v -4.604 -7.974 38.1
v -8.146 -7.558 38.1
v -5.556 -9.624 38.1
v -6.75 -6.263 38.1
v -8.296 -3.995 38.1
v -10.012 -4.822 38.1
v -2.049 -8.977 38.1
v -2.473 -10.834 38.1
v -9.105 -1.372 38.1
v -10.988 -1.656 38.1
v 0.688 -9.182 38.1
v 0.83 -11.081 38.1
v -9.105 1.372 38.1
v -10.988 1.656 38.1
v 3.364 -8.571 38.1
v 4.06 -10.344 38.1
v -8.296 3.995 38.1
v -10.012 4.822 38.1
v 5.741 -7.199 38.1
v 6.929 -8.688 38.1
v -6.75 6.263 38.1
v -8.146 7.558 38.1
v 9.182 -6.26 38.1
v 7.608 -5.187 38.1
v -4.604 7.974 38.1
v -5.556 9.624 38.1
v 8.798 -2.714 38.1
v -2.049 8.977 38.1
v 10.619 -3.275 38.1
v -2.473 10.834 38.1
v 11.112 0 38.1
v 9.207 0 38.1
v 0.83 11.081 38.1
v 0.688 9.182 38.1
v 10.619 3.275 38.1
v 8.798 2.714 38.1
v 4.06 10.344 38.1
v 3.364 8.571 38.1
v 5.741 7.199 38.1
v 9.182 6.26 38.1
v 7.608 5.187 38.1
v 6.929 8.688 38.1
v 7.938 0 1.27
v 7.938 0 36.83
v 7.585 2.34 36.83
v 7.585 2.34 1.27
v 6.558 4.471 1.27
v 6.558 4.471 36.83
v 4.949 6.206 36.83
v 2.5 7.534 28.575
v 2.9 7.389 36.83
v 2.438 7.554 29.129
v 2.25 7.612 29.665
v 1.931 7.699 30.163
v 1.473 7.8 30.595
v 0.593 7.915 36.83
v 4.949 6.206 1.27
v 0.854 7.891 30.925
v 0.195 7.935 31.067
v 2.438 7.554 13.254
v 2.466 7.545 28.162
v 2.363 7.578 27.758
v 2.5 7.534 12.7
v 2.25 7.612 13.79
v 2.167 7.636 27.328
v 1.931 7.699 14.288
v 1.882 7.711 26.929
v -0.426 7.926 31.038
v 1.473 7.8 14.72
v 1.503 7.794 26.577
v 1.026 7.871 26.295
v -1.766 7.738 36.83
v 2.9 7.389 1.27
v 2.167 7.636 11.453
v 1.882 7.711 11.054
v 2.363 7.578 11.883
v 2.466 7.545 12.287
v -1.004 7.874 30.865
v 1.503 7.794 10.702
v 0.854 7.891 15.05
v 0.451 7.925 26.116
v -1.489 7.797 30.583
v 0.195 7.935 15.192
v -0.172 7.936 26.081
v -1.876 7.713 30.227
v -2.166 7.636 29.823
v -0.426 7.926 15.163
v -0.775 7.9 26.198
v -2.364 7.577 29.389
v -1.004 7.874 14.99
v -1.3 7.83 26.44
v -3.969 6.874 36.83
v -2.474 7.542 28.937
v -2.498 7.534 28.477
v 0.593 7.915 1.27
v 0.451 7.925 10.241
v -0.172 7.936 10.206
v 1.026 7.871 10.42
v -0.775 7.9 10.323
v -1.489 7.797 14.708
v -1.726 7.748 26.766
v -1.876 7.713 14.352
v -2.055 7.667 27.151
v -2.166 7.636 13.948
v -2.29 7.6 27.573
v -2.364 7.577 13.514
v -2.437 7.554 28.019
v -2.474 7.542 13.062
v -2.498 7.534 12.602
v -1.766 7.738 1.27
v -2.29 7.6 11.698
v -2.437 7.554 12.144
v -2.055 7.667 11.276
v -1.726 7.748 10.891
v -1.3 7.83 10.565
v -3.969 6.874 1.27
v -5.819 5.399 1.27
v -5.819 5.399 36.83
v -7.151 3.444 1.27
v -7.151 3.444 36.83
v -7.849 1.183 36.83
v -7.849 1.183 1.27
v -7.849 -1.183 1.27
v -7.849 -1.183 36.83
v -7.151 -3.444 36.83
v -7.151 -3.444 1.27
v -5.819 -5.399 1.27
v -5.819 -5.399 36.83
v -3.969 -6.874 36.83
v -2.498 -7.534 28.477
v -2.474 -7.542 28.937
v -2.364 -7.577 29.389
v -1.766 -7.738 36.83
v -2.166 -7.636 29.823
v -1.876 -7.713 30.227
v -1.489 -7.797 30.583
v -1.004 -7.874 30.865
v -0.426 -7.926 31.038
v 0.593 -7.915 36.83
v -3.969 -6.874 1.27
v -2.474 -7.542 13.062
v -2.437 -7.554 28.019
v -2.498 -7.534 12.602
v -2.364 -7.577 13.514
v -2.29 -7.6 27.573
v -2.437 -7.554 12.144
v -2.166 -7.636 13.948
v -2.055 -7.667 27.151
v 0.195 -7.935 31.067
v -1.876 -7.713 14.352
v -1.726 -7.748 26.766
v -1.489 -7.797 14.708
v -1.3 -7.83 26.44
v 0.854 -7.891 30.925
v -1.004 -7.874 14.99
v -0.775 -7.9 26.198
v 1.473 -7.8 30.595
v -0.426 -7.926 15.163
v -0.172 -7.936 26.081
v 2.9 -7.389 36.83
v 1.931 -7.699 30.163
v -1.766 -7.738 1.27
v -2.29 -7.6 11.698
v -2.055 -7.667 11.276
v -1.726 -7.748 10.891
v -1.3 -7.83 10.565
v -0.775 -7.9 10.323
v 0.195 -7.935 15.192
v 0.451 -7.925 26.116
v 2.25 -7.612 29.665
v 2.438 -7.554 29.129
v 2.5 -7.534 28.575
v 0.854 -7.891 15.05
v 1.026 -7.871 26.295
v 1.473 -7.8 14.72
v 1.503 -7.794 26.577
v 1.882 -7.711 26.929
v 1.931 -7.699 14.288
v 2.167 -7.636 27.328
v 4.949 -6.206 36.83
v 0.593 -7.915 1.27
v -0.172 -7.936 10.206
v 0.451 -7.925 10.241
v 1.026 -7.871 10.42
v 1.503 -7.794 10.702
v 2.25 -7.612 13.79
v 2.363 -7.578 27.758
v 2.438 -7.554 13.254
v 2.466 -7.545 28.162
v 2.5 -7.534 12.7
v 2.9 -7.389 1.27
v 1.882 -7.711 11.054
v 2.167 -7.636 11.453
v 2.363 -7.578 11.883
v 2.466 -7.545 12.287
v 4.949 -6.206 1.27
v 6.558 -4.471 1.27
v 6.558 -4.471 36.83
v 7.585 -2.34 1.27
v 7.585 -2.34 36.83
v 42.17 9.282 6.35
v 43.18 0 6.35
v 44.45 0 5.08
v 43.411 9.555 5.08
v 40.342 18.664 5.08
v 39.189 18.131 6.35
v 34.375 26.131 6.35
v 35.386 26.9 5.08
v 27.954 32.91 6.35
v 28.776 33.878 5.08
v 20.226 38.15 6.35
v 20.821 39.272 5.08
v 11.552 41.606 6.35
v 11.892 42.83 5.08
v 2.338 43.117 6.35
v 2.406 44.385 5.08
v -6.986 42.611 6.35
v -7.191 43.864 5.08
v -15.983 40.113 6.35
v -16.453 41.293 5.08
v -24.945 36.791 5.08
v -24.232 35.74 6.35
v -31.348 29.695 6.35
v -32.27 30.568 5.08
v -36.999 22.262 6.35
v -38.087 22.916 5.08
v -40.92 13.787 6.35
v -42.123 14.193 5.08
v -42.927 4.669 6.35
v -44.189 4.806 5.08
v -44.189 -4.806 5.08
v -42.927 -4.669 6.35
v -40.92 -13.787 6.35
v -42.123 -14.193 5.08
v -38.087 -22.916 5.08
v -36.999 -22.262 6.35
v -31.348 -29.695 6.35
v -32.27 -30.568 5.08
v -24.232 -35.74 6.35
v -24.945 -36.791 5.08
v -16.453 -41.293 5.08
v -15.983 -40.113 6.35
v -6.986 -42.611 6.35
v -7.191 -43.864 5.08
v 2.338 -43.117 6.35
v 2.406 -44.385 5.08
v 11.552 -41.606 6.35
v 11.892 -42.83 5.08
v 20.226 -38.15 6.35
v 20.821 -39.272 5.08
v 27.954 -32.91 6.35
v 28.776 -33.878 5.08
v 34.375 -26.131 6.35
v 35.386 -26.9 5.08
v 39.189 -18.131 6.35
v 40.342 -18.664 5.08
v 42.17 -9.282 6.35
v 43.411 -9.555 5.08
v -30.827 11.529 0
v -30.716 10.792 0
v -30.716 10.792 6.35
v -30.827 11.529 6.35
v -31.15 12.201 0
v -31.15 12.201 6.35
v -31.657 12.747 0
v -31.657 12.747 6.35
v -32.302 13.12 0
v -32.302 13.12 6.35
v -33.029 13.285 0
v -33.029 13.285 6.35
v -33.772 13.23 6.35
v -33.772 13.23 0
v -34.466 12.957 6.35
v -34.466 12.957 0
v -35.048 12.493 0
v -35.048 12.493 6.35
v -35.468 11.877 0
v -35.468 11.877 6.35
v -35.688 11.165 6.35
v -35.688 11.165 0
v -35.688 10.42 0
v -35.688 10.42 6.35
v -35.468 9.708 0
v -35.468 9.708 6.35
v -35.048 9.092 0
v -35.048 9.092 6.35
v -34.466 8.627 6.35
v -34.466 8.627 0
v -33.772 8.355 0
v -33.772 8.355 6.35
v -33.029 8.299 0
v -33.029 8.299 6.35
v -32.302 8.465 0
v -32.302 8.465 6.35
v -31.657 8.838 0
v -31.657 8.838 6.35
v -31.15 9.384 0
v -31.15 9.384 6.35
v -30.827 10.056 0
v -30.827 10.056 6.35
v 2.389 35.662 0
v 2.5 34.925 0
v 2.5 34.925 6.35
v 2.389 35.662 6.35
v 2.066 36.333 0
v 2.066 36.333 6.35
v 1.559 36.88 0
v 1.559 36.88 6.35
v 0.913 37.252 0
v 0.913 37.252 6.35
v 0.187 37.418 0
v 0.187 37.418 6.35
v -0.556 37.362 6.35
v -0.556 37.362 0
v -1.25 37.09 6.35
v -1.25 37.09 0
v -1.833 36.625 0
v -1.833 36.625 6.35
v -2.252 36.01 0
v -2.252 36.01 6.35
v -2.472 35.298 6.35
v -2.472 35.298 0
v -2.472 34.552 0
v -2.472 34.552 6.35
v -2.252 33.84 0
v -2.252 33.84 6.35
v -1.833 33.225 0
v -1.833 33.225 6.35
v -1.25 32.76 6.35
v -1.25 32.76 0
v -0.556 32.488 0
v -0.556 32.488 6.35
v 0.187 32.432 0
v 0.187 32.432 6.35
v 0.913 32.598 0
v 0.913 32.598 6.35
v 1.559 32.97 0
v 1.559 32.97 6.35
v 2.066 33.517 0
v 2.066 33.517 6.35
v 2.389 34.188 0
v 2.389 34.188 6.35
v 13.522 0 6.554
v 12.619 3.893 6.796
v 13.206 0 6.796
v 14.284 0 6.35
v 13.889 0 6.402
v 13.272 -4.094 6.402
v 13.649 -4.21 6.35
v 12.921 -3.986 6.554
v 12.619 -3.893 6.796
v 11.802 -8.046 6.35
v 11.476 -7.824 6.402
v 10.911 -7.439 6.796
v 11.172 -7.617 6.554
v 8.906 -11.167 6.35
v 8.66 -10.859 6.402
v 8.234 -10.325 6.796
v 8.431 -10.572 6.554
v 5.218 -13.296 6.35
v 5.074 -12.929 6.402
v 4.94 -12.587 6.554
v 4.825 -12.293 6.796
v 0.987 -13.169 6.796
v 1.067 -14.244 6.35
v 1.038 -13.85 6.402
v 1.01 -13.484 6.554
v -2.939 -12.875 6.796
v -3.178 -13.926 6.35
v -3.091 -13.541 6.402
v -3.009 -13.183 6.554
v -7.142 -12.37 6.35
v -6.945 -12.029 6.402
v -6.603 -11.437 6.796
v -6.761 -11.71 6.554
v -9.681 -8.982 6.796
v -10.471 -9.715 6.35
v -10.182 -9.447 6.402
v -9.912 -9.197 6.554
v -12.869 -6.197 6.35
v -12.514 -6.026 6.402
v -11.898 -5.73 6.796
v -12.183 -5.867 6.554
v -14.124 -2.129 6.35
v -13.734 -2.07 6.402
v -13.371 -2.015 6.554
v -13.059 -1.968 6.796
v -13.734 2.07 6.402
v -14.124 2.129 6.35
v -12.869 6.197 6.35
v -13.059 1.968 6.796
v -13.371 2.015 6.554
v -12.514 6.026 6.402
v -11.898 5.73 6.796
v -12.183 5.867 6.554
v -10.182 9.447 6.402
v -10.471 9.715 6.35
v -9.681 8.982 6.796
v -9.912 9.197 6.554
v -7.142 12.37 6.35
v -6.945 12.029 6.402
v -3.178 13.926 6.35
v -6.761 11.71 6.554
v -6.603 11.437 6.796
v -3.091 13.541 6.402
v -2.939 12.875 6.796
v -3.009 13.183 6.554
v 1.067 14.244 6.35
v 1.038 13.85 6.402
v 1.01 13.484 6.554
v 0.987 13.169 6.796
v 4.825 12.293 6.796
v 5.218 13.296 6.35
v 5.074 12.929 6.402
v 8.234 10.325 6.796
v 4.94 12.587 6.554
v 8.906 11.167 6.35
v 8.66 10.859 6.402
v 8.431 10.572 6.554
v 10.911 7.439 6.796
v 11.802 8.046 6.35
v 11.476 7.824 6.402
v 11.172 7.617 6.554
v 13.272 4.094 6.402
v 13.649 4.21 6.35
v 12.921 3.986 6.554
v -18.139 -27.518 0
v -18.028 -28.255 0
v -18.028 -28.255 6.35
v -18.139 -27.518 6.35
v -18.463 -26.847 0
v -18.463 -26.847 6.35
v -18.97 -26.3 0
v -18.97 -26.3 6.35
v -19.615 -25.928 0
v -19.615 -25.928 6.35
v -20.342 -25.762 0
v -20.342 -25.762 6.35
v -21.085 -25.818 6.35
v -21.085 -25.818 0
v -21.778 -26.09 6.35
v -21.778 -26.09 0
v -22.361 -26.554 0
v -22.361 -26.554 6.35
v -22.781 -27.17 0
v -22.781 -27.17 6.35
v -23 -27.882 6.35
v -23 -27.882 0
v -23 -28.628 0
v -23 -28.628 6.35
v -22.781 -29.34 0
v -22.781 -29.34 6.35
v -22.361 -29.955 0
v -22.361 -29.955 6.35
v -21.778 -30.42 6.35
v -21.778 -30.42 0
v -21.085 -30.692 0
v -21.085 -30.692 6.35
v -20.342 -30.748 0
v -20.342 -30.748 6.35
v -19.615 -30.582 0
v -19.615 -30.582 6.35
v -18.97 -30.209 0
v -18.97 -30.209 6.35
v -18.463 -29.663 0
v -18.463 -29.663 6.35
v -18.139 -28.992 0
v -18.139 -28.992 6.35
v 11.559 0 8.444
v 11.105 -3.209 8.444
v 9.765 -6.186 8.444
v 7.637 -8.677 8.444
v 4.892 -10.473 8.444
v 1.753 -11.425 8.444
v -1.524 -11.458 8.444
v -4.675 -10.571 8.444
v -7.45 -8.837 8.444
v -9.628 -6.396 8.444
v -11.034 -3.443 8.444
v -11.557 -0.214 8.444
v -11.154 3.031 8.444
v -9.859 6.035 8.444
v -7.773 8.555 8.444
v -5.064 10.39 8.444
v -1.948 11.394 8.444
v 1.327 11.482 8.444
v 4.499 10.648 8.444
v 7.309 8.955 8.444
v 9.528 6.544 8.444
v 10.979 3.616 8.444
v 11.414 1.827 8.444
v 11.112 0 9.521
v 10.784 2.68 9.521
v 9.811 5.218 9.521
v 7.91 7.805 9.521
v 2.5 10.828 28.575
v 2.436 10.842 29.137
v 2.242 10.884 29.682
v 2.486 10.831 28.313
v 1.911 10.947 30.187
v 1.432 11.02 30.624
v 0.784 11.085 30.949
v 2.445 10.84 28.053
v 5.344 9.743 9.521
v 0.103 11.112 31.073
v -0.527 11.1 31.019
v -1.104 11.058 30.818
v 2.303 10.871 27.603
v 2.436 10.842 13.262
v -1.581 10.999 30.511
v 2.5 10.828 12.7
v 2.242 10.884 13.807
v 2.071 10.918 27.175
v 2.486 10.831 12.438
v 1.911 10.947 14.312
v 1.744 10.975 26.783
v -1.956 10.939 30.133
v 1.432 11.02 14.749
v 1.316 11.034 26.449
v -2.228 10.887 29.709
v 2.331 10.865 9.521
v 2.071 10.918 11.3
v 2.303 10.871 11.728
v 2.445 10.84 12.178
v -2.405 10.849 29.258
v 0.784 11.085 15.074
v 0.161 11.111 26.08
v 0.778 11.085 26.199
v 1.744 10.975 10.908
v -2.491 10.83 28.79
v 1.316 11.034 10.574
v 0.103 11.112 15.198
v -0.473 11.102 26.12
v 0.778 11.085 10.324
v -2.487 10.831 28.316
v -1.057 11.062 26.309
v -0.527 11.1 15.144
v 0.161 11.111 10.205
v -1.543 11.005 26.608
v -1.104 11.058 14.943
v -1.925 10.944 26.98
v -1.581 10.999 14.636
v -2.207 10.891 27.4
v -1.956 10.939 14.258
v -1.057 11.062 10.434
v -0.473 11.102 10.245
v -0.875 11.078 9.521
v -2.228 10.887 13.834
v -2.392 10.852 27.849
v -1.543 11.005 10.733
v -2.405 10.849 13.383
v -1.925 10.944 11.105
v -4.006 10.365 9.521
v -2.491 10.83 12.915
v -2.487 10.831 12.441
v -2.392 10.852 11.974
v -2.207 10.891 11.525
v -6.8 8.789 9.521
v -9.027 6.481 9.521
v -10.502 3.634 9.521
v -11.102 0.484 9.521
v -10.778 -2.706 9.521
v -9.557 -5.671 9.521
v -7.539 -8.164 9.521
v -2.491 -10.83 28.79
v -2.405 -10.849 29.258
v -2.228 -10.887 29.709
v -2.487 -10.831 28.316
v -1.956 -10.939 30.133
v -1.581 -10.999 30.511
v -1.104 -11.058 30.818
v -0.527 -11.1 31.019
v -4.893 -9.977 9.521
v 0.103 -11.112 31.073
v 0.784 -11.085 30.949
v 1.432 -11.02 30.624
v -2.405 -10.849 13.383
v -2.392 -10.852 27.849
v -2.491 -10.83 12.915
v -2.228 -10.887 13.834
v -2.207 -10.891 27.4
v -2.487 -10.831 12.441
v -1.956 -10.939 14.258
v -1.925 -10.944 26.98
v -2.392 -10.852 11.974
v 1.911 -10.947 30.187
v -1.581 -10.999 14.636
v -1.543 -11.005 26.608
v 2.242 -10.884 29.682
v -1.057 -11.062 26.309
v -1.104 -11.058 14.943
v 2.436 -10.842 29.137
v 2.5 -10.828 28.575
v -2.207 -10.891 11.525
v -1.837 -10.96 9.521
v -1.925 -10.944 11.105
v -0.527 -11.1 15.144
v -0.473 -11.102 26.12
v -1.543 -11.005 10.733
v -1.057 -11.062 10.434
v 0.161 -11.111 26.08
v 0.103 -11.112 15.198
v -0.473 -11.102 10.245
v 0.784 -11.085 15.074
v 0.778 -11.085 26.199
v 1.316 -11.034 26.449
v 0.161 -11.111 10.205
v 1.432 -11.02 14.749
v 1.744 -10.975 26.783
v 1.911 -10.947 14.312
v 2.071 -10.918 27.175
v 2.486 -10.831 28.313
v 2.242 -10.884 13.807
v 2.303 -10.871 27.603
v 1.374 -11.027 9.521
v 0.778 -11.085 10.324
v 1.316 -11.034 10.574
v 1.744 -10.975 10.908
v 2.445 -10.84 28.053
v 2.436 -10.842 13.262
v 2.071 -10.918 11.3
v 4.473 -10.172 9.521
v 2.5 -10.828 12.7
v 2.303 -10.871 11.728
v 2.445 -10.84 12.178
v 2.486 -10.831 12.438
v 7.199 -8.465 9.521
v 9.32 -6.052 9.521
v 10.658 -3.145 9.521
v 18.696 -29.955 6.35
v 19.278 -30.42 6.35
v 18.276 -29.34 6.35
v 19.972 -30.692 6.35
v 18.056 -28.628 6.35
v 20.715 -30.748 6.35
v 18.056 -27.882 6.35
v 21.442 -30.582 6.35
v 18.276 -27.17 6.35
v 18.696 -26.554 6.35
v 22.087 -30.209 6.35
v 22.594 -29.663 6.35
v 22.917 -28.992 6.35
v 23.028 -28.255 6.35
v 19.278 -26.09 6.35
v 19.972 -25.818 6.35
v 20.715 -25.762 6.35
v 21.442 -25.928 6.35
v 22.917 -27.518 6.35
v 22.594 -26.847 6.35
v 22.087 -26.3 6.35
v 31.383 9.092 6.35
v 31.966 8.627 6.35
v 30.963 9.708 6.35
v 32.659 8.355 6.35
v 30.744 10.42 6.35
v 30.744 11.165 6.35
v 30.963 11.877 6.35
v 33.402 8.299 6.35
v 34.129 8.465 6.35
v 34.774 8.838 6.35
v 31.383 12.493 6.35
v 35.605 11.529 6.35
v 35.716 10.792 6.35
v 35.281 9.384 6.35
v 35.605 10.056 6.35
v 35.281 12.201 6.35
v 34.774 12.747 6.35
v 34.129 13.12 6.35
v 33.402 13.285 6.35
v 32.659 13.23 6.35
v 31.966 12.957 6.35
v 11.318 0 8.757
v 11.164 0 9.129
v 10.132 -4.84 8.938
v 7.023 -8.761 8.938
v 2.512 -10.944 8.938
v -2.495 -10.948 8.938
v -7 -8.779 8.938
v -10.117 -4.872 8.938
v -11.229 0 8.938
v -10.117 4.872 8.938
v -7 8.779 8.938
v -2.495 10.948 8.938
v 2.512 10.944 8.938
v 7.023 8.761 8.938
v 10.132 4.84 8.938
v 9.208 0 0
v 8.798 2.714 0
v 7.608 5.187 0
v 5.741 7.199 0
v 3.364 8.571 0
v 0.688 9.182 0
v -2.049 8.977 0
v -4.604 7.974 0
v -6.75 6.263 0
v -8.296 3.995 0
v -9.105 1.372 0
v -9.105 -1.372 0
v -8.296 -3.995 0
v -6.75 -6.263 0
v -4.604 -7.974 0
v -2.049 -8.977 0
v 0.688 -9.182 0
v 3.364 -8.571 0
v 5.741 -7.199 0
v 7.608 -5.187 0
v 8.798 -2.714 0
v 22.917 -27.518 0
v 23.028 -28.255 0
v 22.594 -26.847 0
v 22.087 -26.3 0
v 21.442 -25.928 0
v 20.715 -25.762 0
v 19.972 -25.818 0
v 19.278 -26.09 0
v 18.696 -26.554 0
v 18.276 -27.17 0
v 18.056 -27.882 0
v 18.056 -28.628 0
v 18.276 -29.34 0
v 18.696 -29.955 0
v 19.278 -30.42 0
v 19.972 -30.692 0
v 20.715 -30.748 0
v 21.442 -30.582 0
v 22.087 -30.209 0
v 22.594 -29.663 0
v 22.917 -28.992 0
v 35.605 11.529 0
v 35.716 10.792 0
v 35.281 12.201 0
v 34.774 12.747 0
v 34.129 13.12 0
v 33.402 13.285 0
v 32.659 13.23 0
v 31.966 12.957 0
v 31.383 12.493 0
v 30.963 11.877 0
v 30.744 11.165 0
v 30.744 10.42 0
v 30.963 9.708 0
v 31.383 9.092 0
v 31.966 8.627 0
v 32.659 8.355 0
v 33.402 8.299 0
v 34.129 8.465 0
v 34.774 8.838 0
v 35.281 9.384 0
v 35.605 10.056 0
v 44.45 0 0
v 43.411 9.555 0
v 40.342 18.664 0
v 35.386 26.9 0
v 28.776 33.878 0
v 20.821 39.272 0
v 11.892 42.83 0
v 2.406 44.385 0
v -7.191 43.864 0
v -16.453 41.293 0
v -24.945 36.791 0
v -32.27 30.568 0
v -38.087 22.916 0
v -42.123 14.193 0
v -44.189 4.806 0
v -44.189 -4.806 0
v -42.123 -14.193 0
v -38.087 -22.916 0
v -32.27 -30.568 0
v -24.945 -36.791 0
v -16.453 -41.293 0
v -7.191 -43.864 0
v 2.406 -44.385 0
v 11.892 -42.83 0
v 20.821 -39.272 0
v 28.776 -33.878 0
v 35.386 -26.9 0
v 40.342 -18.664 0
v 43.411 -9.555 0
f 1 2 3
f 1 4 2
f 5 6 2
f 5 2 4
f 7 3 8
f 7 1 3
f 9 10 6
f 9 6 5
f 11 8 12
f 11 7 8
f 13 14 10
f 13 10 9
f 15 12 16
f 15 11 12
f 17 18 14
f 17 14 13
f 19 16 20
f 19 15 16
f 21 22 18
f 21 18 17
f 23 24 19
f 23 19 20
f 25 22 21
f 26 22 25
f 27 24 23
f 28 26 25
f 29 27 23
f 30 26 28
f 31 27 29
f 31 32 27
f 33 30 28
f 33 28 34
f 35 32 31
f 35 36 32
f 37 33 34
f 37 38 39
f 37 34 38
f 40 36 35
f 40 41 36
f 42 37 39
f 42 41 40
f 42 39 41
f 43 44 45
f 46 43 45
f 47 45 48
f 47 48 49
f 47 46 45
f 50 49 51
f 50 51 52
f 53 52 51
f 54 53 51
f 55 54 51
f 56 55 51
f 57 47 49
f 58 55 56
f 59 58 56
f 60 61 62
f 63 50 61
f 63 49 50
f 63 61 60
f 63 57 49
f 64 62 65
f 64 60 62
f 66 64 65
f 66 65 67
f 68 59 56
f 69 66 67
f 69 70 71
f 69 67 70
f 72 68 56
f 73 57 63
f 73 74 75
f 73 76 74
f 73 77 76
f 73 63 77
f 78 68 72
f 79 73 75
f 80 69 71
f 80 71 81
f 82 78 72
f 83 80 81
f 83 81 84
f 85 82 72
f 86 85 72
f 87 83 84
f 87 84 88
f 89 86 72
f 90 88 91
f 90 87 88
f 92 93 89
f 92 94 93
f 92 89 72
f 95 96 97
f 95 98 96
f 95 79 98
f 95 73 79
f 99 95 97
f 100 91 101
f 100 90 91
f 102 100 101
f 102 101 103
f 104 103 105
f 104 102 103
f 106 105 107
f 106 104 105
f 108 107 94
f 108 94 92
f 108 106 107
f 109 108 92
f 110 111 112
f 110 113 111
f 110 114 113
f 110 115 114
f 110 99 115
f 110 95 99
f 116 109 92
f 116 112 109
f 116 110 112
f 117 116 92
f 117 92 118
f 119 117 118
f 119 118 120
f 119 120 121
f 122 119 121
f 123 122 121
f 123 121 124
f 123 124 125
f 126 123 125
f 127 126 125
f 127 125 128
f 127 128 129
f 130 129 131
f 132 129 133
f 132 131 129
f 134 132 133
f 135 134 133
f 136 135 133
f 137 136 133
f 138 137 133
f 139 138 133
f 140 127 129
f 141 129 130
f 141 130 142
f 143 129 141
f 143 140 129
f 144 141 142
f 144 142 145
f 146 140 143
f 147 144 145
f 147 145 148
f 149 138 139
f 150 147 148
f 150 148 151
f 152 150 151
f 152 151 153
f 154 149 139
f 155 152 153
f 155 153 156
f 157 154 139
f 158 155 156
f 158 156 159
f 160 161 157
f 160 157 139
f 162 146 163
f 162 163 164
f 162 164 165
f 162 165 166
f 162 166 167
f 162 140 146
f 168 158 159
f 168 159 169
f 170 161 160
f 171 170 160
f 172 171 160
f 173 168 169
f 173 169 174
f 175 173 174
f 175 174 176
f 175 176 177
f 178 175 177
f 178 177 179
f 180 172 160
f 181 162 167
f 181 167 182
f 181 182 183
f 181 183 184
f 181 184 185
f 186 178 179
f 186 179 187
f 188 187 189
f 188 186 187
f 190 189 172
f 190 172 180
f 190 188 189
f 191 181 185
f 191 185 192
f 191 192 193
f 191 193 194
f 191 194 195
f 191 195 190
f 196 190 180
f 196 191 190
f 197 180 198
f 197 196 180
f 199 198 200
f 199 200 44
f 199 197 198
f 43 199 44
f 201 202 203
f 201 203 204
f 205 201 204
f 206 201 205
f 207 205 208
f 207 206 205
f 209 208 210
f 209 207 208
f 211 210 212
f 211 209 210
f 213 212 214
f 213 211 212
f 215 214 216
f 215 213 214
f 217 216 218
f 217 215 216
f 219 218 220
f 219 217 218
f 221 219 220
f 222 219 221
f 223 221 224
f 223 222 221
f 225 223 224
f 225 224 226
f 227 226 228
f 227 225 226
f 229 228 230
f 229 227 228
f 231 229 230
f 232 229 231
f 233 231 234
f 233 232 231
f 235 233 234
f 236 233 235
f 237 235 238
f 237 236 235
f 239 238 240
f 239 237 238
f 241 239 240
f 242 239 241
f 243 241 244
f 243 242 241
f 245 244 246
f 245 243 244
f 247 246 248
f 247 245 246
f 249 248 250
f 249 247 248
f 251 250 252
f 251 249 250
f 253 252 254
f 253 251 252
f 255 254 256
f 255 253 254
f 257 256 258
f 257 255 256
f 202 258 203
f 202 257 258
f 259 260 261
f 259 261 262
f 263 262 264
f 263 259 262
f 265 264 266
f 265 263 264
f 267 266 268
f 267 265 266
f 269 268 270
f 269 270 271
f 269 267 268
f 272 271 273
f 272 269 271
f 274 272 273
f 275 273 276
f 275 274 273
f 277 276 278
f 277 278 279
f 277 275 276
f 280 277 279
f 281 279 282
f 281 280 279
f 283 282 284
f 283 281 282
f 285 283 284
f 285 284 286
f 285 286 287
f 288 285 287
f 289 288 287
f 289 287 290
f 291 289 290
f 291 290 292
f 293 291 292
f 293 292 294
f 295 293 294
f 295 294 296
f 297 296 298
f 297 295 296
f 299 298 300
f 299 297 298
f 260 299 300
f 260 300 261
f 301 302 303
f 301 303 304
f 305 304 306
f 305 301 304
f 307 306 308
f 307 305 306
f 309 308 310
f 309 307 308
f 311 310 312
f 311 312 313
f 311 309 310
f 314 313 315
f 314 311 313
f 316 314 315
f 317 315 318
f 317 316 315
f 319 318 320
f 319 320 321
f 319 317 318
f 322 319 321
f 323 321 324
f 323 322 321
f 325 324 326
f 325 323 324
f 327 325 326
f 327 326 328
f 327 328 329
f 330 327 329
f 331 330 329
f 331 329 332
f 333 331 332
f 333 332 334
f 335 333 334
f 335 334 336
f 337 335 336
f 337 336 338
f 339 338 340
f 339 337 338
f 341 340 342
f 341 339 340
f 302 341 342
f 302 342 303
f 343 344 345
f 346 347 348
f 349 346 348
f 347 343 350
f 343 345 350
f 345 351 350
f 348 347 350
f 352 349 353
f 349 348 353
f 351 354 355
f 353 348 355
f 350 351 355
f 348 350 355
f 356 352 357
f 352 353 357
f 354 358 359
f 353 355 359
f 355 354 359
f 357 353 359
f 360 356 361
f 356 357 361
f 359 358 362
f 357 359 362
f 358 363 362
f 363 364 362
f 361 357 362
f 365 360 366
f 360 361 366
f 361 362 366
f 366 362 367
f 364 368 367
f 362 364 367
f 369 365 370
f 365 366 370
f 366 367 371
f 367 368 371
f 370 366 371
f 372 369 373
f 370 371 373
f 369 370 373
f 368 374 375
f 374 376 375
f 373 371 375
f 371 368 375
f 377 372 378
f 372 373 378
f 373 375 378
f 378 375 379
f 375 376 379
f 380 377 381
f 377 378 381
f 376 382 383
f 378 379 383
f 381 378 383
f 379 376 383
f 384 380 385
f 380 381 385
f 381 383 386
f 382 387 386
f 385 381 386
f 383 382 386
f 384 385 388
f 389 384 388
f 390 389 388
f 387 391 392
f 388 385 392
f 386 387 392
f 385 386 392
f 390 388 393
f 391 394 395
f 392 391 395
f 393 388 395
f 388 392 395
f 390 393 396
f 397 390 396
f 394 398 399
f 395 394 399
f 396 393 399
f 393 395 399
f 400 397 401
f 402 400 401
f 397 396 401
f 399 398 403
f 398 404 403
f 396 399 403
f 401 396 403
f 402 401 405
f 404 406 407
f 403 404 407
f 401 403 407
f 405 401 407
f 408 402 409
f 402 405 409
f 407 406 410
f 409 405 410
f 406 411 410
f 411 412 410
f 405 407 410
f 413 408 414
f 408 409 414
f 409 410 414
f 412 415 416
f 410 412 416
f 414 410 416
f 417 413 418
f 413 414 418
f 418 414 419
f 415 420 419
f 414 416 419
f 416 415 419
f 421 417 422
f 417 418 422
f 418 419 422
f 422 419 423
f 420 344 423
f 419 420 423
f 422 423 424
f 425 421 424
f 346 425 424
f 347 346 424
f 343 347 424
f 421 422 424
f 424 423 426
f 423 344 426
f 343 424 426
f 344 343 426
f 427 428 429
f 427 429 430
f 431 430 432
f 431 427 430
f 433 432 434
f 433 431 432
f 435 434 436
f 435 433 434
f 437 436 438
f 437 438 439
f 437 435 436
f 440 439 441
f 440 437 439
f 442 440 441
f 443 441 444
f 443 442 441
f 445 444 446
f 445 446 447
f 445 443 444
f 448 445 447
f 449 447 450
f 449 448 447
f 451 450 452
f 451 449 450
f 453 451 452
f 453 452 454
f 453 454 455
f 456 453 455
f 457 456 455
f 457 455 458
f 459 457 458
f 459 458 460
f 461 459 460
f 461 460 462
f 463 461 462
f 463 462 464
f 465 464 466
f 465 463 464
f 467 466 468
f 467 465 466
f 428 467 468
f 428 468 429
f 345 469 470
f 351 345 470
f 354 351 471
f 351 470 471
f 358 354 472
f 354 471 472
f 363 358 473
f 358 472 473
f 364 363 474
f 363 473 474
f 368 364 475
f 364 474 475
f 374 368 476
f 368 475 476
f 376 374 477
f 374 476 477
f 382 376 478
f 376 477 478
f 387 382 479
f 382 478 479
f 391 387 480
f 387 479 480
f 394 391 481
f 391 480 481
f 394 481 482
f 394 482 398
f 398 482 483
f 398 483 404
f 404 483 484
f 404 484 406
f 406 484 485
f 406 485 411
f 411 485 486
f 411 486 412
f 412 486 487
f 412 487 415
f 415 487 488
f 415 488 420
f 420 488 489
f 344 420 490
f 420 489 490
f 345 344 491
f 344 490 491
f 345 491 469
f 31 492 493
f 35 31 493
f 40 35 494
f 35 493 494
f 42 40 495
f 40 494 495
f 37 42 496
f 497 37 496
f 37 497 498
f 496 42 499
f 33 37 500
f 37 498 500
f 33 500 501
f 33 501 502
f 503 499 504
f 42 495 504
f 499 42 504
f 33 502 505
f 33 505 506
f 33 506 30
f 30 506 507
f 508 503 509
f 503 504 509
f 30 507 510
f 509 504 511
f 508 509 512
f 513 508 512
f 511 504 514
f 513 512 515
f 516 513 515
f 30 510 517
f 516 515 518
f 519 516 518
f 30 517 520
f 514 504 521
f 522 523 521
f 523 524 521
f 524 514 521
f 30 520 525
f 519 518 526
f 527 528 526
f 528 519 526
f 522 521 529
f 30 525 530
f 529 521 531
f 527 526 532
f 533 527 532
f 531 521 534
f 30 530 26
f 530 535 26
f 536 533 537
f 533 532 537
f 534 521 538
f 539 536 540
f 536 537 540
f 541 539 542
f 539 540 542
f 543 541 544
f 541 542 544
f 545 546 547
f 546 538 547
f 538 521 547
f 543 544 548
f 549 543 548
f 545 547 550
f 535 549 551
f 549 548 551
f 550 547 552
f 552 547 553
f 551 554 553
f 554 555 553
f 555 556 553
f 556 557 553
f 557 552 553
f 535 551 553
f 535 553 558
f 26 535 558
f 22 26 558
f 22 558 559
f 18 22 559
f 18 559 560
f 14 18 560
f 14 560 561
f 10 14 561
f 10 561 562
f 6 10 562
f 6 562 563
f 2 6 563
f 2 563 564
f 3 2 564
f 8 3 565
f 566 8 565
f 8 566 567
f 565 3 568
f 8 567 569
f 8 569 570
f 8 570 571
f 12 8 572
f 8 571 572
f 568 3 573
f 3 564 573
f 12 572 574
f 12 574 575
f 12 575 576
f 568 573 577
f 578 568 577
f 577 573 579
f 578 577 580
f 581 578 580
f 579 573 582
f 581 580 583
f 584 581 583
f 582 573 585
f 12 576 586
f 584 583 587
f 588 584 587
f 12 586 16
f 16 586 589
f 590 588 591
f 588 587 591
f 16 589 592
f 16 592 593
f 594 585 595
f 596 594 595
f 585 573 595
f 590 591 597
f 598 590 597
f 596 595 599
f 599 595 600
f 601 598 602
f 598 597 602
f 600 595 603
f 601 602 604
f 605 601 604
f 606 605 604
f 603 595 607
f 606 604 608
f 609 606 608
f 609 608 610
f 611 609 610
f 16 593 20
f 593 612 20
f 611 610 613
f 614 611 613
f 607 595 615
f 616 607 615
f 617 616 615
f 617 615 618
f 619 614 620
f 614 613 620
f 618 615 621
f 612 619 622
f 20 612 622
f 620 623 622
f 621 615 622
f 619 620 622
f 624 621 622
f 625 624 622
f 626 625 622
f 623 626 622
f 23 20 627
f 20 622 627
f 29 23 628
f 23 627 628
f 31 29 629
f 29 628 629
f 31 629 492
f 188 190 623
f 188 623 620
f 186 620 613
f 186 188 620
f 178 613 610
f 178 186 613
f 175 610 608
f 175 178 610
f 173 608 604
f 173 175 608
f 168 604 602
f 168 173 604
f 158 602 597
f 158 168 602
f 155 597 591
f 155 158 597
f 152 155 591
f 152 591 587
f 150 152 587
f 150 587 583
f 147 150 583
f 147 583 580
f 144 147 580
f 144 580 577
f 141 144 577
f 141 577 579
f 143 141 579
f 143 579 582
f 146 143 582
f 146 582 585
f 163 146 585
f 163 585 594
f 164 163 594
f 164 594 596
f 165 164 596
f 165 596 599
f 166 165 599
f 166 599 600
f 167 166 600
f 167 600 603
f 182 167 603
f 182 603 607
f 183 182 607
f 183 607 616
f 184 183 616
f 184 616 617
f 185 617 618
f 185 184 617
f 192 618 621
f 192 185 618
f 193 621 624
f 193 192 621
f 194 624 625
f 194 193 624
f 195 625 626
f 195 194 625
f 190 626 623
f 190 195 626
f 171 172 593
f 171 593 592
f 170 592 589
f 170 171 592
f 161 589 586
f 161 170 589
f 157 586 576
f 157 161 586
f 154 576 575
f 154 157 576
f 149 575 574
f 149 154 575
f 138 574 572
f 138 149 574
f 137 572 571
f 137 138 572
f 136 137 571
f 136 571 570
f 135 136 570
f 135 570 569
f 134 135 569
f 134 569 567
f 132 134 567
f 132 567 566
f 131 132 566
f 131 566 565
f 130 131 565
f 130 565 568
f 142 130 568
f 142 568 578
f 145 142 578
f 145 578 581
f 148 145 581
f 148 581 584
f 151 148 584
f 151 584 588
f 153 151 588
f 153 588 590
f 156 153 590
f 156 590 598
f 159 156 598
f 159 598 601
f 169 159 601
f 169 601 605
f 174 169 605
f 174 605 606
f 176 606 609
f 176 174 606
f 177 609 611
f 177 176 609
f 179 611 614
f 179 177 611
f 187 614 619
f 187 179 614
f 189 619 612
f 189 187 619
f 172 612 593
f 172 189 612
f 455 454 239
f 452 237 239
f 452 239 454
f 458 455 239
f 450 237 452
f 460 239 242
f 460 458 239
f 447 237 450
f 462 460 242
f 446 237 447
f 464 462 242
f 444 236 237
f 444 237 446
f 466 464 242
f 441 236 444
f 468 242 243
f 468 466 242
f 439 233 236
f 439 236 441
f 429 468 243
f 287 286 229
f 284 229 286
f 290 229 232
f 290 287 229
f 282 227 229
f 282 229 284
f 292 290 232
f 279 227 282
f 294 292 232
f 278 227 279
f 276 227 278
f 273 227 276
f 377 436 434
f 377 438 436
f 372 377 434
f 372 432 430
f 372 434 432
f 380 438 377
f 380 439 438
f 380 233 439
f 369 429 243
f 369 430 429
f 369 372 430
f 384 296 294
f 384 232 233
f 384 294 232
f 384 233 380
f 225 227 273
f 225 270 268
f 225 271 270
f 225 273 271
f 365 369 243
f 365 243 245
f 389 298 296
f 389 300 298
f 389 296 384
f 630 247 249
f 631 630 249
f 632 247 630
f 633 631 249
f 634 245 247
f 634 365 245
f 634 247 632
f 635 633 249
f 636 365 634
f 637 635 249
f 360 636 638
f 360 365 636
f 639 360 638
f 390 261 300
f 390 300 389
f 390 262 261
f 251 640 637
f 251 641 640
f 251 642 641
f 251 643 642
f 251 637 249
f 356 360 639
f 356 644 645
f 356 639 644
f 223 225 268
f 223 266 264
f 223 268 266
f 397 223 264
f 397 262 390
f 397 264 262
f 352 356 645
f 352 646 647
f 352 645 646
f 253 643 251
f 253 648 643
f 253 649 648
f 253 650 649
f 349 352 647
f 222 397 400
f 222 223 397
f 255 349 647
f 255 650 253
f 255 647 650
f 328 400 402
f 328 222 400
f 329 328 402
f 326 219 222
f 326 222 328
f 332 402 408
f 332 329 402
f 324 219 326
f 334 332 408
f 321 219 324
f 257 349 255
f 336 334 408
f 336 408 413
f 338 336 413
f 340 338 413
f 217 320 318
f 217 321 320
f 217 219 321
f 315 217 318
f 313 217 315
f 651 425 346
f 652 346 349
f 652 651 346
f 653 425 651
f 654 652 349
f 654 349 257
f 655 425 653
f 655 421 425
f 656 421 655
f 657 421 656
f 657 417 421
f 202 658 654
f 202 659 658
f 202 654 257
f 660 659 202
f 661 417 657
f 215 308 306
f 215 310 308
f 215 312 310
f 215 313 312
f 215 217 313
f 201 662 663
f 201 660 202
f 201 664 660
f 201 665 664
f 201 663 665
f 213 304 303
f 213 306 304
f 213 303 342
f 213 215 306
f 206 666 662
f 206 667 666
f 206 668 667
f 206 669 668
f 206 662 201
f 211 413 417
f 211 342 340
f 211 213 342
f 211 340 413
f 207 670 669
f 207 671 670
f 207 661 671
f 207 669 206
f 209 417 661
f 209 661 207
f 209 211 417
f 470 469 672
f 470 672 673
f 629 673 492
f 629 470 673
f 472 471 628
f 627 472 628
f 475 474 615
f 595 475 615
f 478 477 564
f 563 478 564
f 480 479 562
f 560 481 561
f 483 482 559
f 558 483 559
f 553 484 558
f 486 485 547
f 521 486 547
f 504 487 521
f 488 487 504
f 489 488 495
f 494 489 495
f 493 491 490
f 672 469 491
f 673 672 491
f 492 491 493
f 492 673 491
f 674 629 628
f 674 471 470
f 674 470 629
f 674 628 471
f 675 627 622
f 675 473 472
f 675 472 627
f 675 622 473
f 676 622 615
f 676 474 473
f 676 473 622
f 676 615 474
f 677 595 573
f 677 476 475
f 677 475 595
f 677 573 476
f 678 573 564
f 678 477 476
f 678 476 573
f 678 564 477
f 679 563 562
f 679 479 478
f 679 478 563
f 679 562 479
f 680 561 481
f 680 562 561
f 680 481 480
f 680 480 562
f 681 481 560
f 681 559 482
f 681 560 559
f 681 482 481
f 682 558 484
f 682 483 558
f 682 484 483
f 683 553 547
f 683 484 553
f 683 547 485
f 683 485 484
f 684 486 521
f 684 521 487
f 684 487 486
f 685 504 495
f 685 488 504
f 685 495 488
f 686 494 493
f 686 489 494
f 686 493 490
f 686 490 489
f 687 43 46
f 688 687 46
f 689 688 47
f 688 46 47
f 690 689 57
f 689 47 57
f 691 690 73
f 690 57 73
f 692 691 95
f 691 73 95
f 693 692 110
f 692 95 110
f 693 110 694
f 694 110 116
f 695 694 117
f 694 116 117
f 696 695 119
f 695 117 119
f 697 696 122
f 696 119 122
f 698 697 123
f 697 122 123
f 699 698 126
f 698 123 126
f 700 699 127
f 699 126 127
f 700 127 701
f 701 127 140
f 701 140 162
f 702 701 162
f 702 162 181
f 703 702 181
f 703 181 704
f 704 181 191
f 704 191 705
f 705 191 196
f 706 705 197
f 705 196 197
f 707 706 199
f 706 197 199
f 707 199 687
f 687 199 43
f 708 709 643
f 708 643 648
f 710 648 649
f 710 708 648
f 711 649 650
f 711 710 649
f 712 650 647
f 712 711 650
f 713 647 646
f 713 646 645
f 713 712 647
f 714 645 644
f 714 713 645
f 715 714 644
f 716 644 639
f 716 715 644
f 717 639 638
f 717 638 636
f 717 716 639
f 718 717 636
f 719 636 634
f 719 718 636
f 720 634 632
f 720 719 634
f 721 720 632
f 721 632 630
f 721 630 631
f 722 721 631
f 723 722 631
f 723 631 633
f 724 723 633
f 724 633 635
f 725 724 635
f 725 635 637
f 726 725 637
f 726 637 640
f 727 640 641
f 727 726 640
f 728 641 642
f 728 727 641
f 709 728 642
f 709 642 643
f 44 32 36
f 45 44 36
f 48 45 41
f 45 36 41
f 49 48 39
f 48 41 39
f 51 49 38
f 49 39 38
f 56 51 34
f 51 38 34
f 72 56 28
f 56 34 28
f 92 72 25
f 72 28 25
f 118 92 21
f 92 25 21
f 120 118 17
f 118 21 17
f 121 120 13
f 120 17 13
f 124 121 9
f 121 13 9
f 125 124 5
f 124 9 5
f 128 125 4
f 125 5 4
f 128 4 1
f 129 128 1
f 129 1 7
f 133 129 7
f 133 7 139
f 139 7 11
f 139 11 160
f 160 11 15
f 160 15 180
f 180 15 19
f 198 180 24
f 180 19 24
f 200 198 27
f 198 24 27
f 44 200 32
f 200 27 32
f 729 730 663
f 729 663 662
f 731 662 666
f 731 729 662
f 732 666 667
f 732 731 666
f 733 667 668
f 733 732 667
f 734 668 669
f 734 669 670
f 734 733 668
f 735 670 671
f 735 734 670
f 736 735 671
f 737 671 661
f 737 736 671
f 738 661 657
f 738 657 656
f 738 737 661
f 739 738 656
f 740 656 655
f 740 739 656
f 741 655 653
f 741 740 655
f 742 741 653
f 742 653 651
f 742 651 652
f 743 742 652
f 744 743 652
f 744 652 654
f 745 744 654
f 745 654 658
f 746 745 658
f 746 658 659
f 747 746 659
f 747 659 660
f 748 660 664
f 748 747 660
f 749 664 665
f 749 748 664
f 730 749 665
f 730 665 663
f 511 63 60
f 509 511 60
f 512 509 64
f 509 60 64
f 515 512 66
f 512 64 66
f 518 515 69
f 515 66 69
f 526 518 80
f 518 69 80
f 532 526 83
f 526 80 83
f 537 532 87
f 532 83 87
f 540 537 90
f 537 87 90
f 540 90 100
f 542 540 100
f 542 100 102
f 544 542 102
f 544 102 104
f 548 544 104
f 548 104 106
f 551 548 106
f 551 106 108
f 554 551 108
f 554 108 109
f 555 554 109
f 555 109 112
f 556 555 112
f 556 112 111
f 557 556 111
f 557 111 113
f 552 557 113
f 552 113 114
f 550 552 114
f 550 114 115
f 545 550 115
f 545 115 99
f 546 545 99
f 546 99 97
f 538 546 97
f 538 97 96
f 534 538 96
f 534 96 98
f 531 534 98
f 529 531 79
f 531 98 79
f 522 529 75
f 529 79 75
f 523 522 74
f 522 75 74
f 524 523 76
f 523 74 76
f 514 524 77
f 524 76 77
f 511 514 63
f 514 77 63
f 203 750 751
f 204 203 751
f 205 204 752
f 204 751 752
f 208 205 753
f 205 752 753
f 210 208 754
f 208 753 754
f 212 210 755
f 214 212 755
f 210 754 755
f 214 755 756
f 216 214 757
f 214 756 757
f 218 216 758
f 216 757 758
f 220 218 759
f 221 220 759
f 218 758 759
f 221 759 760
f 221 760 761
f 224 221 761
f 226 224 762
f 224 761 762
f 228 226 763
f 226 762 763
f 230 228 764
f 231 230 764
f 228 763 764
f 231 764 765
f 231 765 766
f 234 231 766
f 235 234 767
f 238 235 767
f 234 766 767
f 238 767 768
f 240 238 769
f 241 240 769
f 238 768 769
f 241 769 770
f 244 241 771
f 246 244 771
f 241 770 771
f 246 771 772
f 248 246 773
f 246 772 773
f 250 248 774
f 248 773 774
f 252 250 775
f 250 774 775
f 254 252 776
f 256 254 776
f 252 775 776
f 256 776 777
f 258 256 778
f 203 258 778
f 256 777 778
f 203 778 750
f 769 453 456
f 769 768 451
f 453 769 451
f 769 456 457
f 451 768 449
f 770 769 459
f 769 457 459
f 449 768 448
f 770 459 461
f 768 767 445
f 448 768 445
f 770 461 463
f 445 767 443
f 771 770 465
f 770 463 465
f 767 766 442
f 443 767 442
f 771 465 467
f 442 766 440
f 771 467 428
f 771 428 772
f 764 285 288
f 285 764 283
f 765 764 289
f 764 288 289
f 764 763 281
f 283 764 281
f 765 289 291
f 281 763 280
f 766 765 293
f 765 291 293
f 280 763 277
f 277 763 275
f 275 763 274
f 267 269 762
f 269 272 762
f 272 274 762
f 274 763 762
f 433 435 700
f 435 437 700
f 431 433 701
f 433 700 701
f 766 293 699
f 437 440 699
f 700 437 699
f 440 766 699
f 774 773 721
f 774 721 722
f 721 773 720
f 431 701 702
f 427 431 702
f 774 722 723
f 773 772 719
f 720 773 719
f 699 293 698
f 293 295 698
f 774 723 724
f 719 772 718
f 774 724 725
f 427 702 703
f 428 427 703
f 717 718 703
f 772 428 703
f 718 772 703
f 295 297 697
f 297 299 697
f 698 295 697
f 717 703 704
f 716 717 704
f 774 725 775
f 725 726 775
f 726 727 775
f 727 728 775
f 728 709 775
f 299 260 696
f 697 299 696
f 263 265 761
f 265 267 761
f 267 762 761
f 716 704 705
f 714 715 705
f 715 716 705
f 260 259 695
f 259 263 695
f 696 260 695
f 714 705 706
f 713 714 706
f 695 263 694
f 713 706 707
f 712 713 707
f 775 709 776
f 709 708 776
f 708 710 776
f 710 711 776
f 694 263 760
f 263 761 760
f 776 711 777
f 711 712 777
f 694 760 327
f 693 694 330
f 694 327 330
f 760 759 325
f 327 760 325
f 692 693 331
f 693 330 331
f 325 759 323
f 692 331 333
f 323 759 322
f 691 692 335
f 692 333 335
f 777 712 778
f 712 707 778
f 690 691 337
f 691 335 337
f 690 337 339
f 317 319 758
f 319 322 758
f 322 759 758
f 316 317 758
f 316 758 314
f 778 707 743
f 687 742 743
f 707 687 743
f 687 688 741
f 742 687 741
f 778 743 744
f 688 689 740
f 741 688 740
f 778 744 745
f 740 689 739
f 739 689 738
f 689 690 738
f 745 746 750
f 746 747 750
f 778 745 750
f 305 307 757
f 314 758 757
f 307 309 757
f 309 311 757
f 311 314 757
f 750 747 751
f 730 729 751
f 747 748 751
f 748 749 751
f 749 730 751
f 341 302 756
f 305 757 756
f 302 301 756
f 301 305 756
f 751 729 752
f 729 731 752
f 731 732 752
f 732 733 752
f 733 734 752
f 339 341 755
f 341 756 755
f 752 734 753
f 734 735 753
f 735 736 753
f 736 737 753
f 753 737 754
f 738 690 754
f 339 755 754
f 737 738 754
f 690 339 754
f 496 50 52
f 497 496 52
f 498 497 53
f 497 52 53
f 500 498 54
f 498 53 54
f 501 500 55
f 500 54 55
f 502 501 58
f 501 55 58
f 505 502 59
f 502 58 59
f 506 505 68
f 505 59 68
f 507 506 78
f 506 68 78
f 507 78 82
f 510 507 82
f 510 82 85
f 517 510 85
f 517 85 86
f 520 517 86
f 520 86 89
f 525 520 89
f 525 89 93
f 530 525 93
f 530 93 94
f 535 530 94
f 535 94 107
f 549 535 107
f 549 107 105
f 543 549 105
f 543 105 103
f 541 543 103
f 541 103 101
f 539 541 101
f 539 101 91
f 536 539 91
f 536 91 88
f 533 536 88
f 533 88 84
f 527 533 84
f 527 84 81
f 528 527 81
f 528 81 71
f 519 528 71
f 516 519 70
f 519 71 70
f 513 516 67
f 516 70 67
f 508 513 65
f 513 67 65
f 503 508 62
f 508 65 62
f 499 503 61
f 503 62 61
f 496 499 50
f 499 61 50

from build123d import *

# Parameters (mm, degrees)
F0_R          = 44.45
F0_R_2        = 2.5
F0_R_3        = 11.1125
F0_R_4        = 7.9375
F1_DEPTH      = 6.35
F2_DEPTH      = 38.1
F3_R          = 2.5
F4_DEPTH      = 44.451
F4_DEPTH_BACK = 44.451
F5_SIZE       = 1.27
F6_SIZE       = 2.54
F7_R          = 1.524


with BuildPart() as f1:
    # F0 (on Top) → F1 (new body)
    with BuildSketch(Plane.XY):
        Circle(F0_R)
        with Locations((-20.5283999363, -28.2549185285)):
            Circle(F0_R_2, mode=Mode.SUBTRACT)
        with Locations((20.5283999363, -28.2549185285)):
            Circle(F0_R_2, mode=Mode.SUBTRACT)
        with Locations((-33.2156488316, 10.7924185285)):
            Circle(F0_R_2, mode=Mode.SUBTRACT)
        Circle(F0_R_3, mode=Mode.SUBTRACT)
        with Locations((33.2156488316, 10.7924185285)):
            Circle(F0_R_2, mode=Mode.SUBTRACT)
        with Locations((0, 34.925)):
            Circle(F0_R_2, mode=Mode.SUBTRACT)
        Circle(F0_R_3)
        Circle(F0_R_4, mode=Mode.SUBTRACT)
    extrude(amount=F1_DEPTH)

    # F0 (on Top) → F2 (join)
    with BuildSketch(Plane.XY):
        Circle(F0_R_3)
        Circle(F0_R_4, mode=Mode.SUBTRACT)
    extrude(amount=F2_DEPTH)

    # F3 (on Front) → F4 (cut, two sides)
    with BuildSketch(Plane.XZ) as f4_sk:
        with Locations((0, 12.7)):
            Circle(F3_R)
        with Locations((0, 28.575)):
            Circle(F3_R)
    extrude(amount=-F4_DEPTH, mode=Mode.SUBTRACT)
    extrude(f4_sk.sketch, amount=F4_DEPTH_BACK, mode=Mode.SUBTRACT)

    # F5
    f5_edges = [f1.edges().sort_by_distance(p)[0] for p in [
        (-7.9375, 0, 38.1),
        (-7.9375, 0, 0),
        (-44.45, 0, 6.35),
    ]]
    chamfer(f5_edges, length=F5_SIZE)

    # F6
    f6_edges = [f1.edges().sort_by_distance(p)[0] for p in [
        (-11.1125, 0, 6.35),
    ]]
    chamfer(f6_edges, length=F6_SIZE)

    # F7
    f7_edges = [f1.edges().sort_by_distance(p)[0] for p in [
        (-11.1125, 0, 8.89),
        (-13.6525, 0, 6.35),
    ]]
    fillet(f7_edges, radius=F7_R)


solid = f1.part
